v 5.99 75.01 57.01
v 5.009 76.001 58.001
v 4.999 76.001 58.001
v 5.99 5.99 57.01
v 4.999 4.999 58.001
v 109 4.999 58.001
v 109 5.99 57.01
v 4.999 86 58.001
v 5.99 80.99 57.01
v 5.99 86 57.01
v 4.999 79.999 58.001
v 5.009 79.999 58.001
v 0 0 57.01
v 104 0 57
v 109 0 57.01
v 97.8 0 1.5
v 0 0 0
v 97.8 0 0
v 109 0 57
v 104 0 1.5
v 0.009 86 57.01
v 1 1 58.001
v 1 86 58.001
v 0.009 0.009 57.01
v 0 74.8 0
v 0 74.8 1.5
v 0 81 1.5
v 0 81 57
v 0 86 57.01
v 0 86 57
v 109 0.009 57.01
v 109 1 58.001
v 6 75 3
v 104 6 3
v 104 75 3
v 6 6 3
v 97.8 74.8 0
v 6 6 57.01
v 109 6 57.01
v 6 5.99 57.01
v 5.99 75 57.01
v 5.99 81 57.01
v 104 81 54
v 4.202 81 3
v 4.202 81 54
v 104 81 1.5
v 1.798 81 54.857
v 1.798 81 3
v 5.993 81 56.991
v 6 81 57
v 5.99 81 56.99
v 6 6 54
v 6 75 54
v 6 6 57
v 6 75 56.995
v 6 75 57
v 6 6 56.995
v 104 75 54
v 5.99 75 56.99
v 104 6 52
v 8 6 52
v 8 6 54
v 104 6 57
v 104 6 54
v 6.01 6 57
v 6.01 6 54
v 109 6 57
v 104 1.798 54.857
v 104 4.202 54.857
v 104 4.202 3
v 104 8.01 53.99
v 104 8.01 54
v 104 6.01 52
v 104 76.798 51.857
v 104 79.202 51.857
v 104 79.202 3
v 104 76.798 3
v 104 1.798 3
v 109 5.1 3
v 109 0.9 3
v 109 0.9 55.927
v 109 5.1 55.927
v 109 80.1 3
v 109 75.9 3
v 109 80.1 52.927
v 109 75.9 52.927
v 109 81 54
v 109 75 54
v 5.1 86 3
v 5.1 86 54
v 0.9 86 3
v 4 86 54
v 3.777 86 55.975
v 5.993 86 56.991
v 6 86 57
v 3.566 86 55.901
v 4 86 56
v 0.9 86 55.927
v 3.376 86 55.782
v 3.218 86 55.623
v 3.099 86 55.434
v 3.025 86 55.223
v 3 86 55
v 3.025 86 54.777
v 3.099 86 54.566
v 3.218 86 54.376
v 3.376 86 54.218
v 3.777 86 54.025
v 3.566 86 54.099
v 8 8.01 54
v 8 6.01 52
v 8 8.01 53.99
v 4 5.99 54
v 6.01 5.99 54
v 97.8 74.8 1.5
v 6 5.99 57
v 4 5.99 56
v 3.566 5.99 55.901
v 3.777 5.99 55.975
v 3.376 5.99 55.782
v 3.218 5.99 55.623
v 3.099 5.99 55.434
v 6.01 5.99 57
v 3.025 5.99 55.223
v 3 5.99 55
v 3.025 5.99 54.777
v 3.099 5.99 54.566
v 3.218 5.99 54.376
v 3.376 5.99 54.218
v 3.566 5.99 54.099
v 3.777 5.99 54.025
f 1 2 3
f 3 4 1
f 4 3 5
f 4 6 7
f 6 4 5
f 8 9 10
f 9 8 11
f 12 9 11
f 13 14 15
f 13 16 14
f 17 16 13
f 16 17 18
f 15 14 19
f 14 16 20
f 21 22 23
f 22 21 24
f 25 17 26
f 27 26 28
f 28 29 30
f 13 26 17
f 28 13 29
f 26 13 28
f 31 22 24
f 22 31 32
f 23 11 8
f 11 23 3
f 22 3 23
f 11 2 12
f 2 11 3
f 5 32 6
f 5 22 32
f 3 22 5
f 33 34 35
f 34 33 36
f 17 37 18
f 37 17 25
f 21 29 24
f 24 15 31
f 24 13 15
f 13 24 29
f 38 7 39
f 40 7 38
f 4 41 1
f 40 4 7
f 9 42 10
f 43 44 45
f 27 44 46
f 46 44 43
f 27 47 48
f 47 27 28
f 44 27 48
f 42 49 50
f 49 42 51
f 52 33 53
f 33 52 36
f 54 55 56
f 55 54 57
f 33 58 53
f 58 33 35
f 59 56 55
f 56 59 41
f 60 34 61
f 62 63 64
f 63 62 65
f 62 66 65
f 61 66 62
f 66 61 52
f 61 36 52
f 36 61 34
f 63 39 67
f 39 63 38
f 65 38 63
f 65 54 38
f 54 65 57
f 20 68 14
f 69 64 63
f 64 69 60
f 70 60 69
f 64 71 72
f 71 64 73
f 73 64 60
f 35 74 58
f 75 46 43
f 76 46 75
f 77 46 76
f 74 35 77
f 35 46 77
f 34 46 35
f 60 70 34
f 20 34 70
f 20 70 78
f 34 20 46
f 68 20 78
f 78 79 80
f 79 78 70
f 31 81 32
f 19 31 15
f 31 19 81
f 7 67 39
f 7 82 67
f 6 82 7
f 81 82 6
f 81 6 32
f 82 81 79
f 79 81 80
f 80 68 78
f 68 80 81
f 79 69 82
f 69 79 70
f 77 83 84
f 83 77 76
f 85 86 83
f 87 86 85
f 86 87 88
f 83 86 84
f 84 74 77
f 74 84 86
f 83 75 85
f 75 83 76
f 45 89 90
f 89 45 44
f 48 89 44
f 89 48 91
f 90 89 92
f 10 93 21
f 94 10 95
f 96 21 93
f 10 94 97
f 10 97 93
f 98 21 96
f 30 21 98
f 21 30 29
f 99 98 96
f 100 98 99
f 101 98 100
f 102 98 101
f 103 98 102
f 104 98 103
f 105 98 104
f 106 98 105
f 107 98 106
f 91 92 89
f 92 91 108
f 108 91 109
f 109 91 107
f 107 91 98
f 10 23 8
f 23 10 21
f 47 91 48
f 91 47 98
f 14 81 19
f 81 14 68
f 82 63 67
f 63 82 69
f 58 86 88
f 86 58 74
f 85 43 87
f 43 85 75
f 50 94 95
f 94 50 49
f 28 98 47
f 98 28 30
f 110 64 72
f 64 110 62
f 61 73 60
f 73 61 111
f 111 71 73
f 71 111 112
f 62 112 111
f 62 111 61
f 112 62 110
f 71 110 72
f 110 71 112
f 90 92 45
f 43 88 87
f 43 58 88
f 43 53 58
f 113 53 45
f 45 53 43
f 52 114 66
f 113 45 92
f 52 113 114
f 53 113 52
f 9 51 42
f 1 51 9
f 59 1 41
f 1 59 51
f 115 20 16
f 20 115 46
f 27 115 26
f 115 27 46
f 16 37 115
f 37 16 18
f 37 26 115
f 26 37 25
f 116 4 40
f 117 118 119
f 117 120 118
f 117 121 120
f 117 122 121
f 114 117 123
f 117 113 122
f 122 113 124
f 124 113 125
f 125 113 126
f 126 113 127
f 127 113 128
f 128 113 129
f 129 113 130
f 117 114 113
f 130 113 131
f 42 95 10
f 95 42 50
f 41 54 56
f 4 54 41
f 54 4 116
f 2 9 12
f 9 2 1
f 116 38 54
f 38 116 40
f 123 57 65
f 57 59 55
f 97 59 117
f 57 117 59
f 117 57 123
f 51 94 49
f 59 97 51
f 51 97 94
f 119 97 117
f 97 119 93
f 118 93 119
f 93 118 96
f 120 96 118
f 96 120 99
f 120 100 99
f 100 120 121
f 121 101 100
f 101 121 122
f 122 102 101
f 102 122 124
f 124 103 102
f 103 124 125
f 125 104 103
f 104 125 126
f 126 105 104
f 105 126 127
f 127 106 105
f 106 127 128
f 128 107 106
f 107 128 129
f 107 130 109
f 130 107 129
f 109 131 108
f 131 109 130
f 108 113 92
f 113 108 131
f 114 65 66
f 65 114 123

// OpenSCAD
// ============================================================================
// cutlery_box.scad
// Graduated 3-chamber disposable-cutlery box (Option 3) — CUT-FROM-SOLID port
// of build_box.py, for a 120 x 120 x 120 mm printer (AOSEED).
//
// WHY THIS PORT EXISTS (the whole point):
//   The hand-mesh generator (build_box.py) could not keep the 1 mm rim chamfer
//   continuous across the female dovetail joints, because where a slot's flared
//   corner crosses the sloped chamfer it needs a true boolean intersection.
//   OpenSCAD HAS that boolean kernel, so here we do exactly the "cut-from-solid"
//   thing:
//      1. Build the ENTIRE box as ONE solid, WITH the chamfer already on it.
//      2. difference() out vertical dovetail prisms ( /_\ cross-section ),
//         running from just above the base plate up THROUGH the rim, to both
//         (a) form the sliding-dovetail joints, and
//         (b) split the box into 6 bed-sized pieces.
//   Because the cut is a real boolean through the already-chamfered solid, the
//   sloped chamfer<->slot edge is produced for free => the rim chamfer stays
//   CONTINUOUS across every joint, with none of the sliver hacks.
//
// ----------------------------------------------------------------------------
// HOW TO USE
//   In the app:  set `part` below (or use the Customizer dropdown), F5 to
//                preview, F6 to render, then File > Export > STL.
//   One piece (CLI):
//      openscad -o body_knife_A.stl -D 'part="knife_A"' cutlery_box.scad
//   ALL SIX (bash, run from this folder):
//      for p in knife_A knife_B fork_A fork_B spoon_A spoon_B; do \
//        openscad -o "body_$p.stl" -D "part=\"$p\"" cutlery_box.scad ; done
//   PNG preview of one piece:
//      openscad -o knife_B.png --imgsize=1400,1000 --autocenter --viewall \
//        -D 'part="knife_B"' cutlery_box.scad
//
//   Pieces are modelled in ASSEMBLED coordinates (floor-down, z=0 is the bed),
//   so importing all six STLs together shows the assembled box directly; your
//   slicer will auto-drop each one onto the plate for printing.
//
// BED SANITY: every piece is <= 120 mm in X, Y, Z.
//   Z = 58 mm. Widest piece = spoon at 117 mm (Y). A-halves reach 109 mm (X,
//   including the protruding dovetail key). All under 120.
//
// !! I could NOT run OpenSCAD to verify this file (no binary in my sandbox) !!
//   - The rim chamfer is a SMOOTH, true-45 bevel built from hull() frustums of
//     convex rectangles. Works in every OpenSCAD since ~2015 (incl. Homebrew
//     2021.01). No stepped staircase -- and, crucially, it makes box() a clean
//     well-formed solid so the per-part booleans resolve reliably (the old
//     14-slice staircase was fragile and CGAL was dropping the walls of the
//     interior parts, leaving only the key prisms => "floating boxes").
//   - roof() is still available behind USE_ROOF=true for those who have it
//     (2021.01+ snapshots); for THIS rectangular design it is identical, so it
//     is NOT required.
//   - After F6, check the console for "WARNING"/"not a valid 2-manifold".
//     If a tenon ever looks detached, bump EPS to 0.05.
// ============================================================================


/* [Part to render / export] */
part = "knife_A"; // [knife_A, knife_B, fork_A, fork_B, spoon_A, spoon_B, assembly]

/* [Chamfer method] */
// false = smooth hull() frustum bevel (default, any OpenSCAD); true = roof() (2021.01+)
USE_ROOF = false;

/* [Heights (mm)] */
BASE   = 3.0;     // floor / base-plate thickness
COMP_H = 55.0;    // interior wall height above the floor (cutlery stack depth)

/* [Walls (mm)] */
HOST_T   = 6.0;     // thickness of every wall (thick enough to host a dovetail)
HALF_LEN = 104.0;   // printed length of each half (A = near, B = far); <120 incl. key

/* [Chamber bays (mm)] */
N_COL     = 3;       // columns of cutlery per chamber
KNIFE_COL = 23.0;    // -> knife bay 69  (3 x 19 mm knives + play)
FORK_COL  = 33.0;    // -> fork  bay 99  (3 x 29 mm forks  + play)
SPOON_COL = 37.0;    // -> spoon bay 111 (3 x 34 mm spoons + play, trimmed <120)

/* [Dovetail joint (mm)] */
DT_DEPTH = 5.0;   // tail protrusion past the seam (male key depth)
DT_NECK  = 1.2;   // half-width at the seam face (narrow)
DT_FLARE = 2.1;   // half-width at the tip (wide -> locks)
DT_CLR   = 0.4;   // FLANK/seam slide clearance added to the female socket (do not change for fit)
DT_DEPTH_RELIEF = 0.3; // extra depth on the socket BACK only, so the tail tip never bottoms out

/* [Hidden-dovetail top cap / "hat" (mm)] */
// The dovetail otherwise shows its trapezoid outline on the TOP edge of the wall.
// To hide it, the MALE piece extends the wall's full-width top (chamfer included)
// across the key footprint -> a flush, continuous top. The FEMALE piece gets a
// matching top RECESS (cap footprint + CAP_CLR) so the cap drops straight in.
// Result: the top reads as one surface with a single straight seam line at the cap
// tip; the dovetail joinery lives entirely below the cap.
//
// SELF-SUPPORTING UNDERSIDE: the cap reaches the FULL wall width at the chamfer base
// (so the top edge reads as the wall extended, with NO recessed sliver on the outer
// face), and its underside is ONE planar ramp from the chamfer's OUTER CORNER
// (half-width HOST_T/2 at z = BODY_H-CHAMFER) down to the dovetail-neck half-width
// (CAP_FOOT) at CAP_SLANT_DEG from horizontal. No little horizontal step. The ramp
// reaching full width exactly at the chamfer base means "ramp top" == "chamfer base"
// (CAP_H is DERIVED). The FEMALE recess is the same ramp + CAP_CLR play.
// TRADEOFF: because the cap runs all the way to the outer corner, the female wall
// tapers to ~0 at z = BODY_H-CHAMFER -> a thin feather edge at the joint (gradual at
// CAP_SLANT_DEG, hidden inside the joint when assembled). Accepted per design intent.
CAP_SLANT_DEG = 50;     // cap underside ramp angle from horizontal (50 = self-supporting, long flare)
CAP_FOOT = DT_NECK;     // cap-underside half-width where it meets the dovetail neck
CAP_CLR = 0.3;          // slide clearance so the male cap seats into the female top recess

/* [Rim chamfer (mm)] */
CHAMFER = 1.0;    // 45-deg comfort break broken along the top wall edges

/* [Base half-lap / anti-warp (mm)] */
// Neighbouring base plates overlap as a HORIZONTAL half-lap (shiplap) at mid-base
// height, so corners stay coplanar (no lift/protrusion). Horizontal lap faces do
// NOT bind the vertical-drop assembly. Shingle direction: A->B and knife->fork->spoon.
LAP_LEN = 6;        // overlap past the A/B seam and the knife/fork seam
LAP_LEN_FS = 2;     // overlap past the fork/SPOON seam -- SMALLER: spoon is the
                    // tightest piece (117mm of the 120mm bed); a 6mm lap there
                    // would push spoon to 123mm. 2mm keeps spoon at 119mm.
LAP_Z   = BASE/2;   // 1.5 -- horizontal split height of the lap (bottom vs top half)
LAP_CLR = 0.2;      // in-plane clearance so the shelf isn't a press fit

/* [Lid — box features that receive a flat ORDERED clear sheet] */
// The lid itself is NOT printed: it's a flat ~2 mm PETG/Tritan sheet, bullnose-polished
// edges (r=LID_EDGE_R), ordered to size. We only model the box features that receive it.
LID_T            = 2.0;   // ordered sheet thickness
LID_EDGE_R       = 1.0;   // ordered sheet bullnose edge radius (for the sheet order spec)
LID_PLAY         = 0.4;   // total vertical play in the hinge groove (sheet + this)
LID_RECESS       = 2.0;   // lid TOP sits this far BELOW the rim, so the journal pocket is fully
                          // capped (rim caps the bullnose -> retains the lid when raised; tilt-in)
HINGE_AT_MINUS_X = true;  // hinge on the -x (303mm) end wall; clip on +x. (flip = mirror; default delivered)
// perimeter support ledge (lid underside rests on it at z = BODY_H-LID_T)
LEDGE_W          = 2.0;   // ledge inward protrusion (its underside ramps back at 45 deg -> self-supporting)
GROOVE_END_INSET = 0.0;   // groove reaches the corners but RUNS OUT smoothly there (no end-face / no
                          // exposed bore); GROOVE_TAPER sets the run-out length
GROOVE_TAPER     = 4.0;   // y-length over which the eased mouth tapers out at each groove end
// hinge journal (cut into the inner face of the hinge end wall, CONTINUOUS along the long edge)
GROOVE_DEPTH     = 3.0;   // 2mm lead-in slot + 1mm pocket radius -> journal sits 2mm back from the
                          // face so its cap clears the swing relief and RETAINS the lid
GROOVE_POCKET_R  = 1.0;   // journal half-cylinder radius (the bullnose sheet edge rolls in it)
// clip latch (one localized retainer, centered on the clip end wall)
CLIP_W           = 18.0;  // clip width
CLIP_LIP         = 0.4;   // retaining overhang (0.3 light .. 0.6 firm)
CLIP_RAMP_H      = 1.6;   // cam-ramp height above the rim (press-to-close)
// finger scallop (semicircular dish in the rim, centered on & aligned with the clip)
SCALLOP_W        = 16.0;  // scallop width
SCALLOP_DEPTH    = 6.0;   // how far it dishes down from the rim


/* [Hidden] */
EPS      = 0.01;          // tiny overlap so abutting solids fuse cleanly in CGAL
// Upper-chamber pieces (fork, spoon) were cut by a cell plane laid EXACTLY on the
// divider wall's far face (the lower chamber owns that wall). intersection() along a
// plane coincident with an existing box face makes CGAL leave a ZERO-THICKNESS copy
// of the wall face -> edge-manifold + "watertight" but degenerate (OpenSCAD shows it
// as a blue back-face; Tinkercad thickens it into a phantom block). SEAM_EPS nudges
// those cut planes a hair INTO the open bay so they no longer coincide with any box
// face -> no flap. 0.02 mm is physically nothing but is well clear of CGAL's tolerance.
SEAM_EPS = 0.02;
CUT_OVER = 1.0;           // how far dovetail cutters overshoot the rim (clean cut)

BODY_H    = BASE + COMP_H;     // 58  total height
END_WALL  = HOST_T;            // end walls are dovetail hosts too -> equally thick
TOTAL_LEN = 2 * HALF_LEN;      // 208 assembled length (end wall .. end wall)

// hidden-cap ramp geometry (derived).
//   CAP_HW    = cap MAX half-width = HOST_T/2 (the full wall edge) at the chamfer base.
//   CAP_RISE  = vertical height of the self-supporting CAP_SLANT_DEG underside ramp.
//   CAP_ZRAMP = where the cap reaches full width = the chamfer base (BODY_H-CHAMFER), so
//               the ramp runs straight to the chamfer OUTER CORNER (no horizontal step).
//   CAP_ZBOT  = cap bottom = ramp start; CAP_H derived from it (for reference/report).
//   CAP_ZRAMP_R = recess ramp top, shifted down by CAP_CLR so the recess ramp stays
//               parallel to the cap ramp with uniform play.
CAP_HW      = HOST_T/2;   // cap reaches the FULL wall edge at the chamfer base
CAP_RISE    = (CAP_HW - CAP_FOOT) * tan(CAP_SLANT_DEG);
CAP_ZRAMP   = BODY_H - CHAMFER;               // full width exactly at the chamfer base / outer corner
CAP_ZBOT    = CAP_ZRAMP - CAP_RISE;
CAP_H       = BODY_H - CAP_ZBOT;              // derived; reported
CAP_ZRAMP_R = CAP_ZRAMP;   // recess ramp ALSO tops at the chamfer corner (mirror the cap) -> no vertical lip
// sanity checks
assert(CAP_ZBOT > BASE + 1,
       "cap zone dips too low -- raise CAP_SLANT_DEG");
assert(CAP_HW >= DT_FLARE,
       "cap too narrow to cover the dovetail tail");

// NOTE: lid-derived constants are defined BELOW the Y-layout block, because some of
// them (INTERIOR_Y0/Y1, CLIP_CY) depend on OUTER_L / OUTER_R / EXT_W. See "lid derived".

// bay widths
KNIFE_BAY = N_COL * KNIFE_COL; // 69
FORK_BAY  = N_COL * FORK_COL;  // 99
SPOON_BAY = N_COL * SPOON_COL; // 111

// ---- Y layout (width direction): wall | bay | divider | bay | divider | bay | wall
KNIFE_Y0 = 0;
KNIFE_Y1 = HOST_T + KNIFE_BAY + HOST_T;        // 0..81   (outer wall + bay + divider)
FORK_Y0  = KNIFE_Y1;                           // 81
FORK_Y1  = FORK_Y0 + FORK_BAY + HOST_T;        // 81..186 (bay + divider)
SPOON_Y0 = FORK_Y1;                            // 186
SPOON_Y1 = SPOON_Y0 + SPOON_BAY + HOST_T;      // 186..303(bay + outer wall)
EXT_W    = SPOON_Y1;                           // 303 total width

// lengthwise wall Y-bands [y0,y1] (host the A/B dovetails) + their centers
OUTER_L  = [0, HOST_T];                                       // [0,6]    c=3
DIV_KF   = [HOST_T + KNIFE_BAY, HOST_T + KNIFE_BAY + HOST_T]; // [75,81]  c=78
DIV_FS   = [FORK_Y0 + FORK_BAY, FORK_Y0 + FORK_BAY + HOST_T]; // [180,186]c=183
OUTER_R  = [SPOON_Y1 - HOST_T, SPOON_Y1];                     // [297,303]c=300

// ---- lid derived ---- (placed AFTER OUTER_L/OUTER_R/EXT_W so nothing is forward-referenced)
LID_TOP_Z   = BODY_H - LID_RECESS;        // 56  lid TOP (recessed); rim z=58 rises LID_RECESS above it
LID_Z_UNDER = LID_TOP_Z - LID_T;          // 54  lid underside / ledge top / lowered-divider top
POCKET_CZ   = LID_TOP_Z - LID_T/2;        // 55  journal centre (lid mid) -> pocket top = LID_TOP_Z = capped
// hinge end-wall inner face x + inward direction; clip end-wall inner face x + inward dir
HINGE_INX   = HINGE_AT_MINUS_X ? END_WALL : TOTAL_LEN - END_WALL;       // 6  (default)
HINGE_IN    = HINGE_AT_MINUS_X ? 1 : -1;  // interior direction from the hinge wall (+x default)
CLIP_INX    = HINGE_AT_MINUS_X ? TOTAL_LEN - END_WALL : END_WALL;       // 202 (default)
CLIP_IN     = HINGE_AT_MINUS_X ? -1 : 1;  // interior direction from the clip wall (-x default)
POCKET_CX   = HINGE_INX - HINGE_IN*(GROOVE_DEPTH - GROOVE_POCKET_R);    // 5  pocket centre x (INTO the wall)
INTERIOR_Y0 = OUTER_L[1];                 // 6   inner face of the -y short wall
INTERIOR_Y1 = OUTER_R[0];                 // 297 inner face of the +y short wall
CLIP_CY     = EXT_W/2;                     // 151.5 clip/scallop centre (in the fork chamber)
assert(POCKET_CZ - GROOVE_POCKET_R > BASE + 1,
       "journal dips too low -- reduce LID_RECESS or LID_T");
assert(POCKET_CZ + GROOVE_POCKET_R <= LID_TOP_Z + EPS,
       "journal not capped -- lower the lid (raise LID_RECESS) or shrink GROOVE_POCKET_R");
// NOTE: with LID_RECESS the lid underside (and lowered dividers) sit BELOW CAP_ZBOT. That is
// intended: the inner dividers are cut flat below the cap zone (their hidden caps are removed,
// but the lid covers them); the perimeter/end-wall caps are untouched (full-height walls).

// the three OPEN bays are rectangular holes in the wall footprint:
//   footprint = outer rectangle MINUS these bays  (== the 6 walls; verified).
// The smooth chamfer is built from exactly this decomposition.
BAY_X0 = END_WALL;              // 6
BAY_X1 = TOTAL_LEN - END_WALL;  // 202
BAYS = [
    [BAY_X0, BAY_X1, HOST_T,   HOST_T + KNIFE_BAY],   // knife bay [6,202] x [6,75]
    [BAY_X0, BAY_X1, FORK_Y0,  FORK_Y0 + FORK_BAY],   // fork  bay [6,202] x [81,180]
    [BAY_X0, BAY_X1, SPOON_Y0, SPOON_Y0 + SPOON_BAY], // spoon bay [6,202] x [186,297]
];

YC_OUTL  = OUTER_L[0] + HOST_T/2;   // 3   outer-left wall center
YC_DIVKF = DIV_KF[0]  + HOST_T/2;   // 78  knife/fork divider center
YC_DIVFS = DIV_FS[0]  + HOST_T/2;   // 183 fork/spoon divider center
YC_OUTR  = OUTER_R[0] + HOST_T/2;   // 300 outer-right wall center

// seams
AB_SEAM = HALF_LEN;               // 104  A/B length seam (x)
SEAM_KF = FORK_Y0;                // 81   knife/fork width seam (y)
SEAM_FS = SPOON_Y0;              // 186  fork/spoon width seam (y)
ENDC_A  = END_WALL/2;             // 3    A end-wall center (x) -> chamber dovetails
ENDC_B  = TOTAL_LEN - END_WALL/2; // 205  B end-wall center (x)


// ============================================================================
// 2D wall footprint (cross-section of all walls, constant in z for the straight
// part). Union of: 2 full-width end walls + 4 lengthwise walls between them.
// ============================================================================
module wall_footprint_2d() {
    // footprint = outer rectangle minus the 3 open bays  (== the 6 walls)
    difference() {
        square([TOTAL_LEN, EXT_W]);
        for (b = BAYS) translate([b[0], b[2]]) square([b[1] - b[0], b[3] - b[2]]);
    }
}

// ============================================================================
// The full chamfered box solid = base plate + walls with a continuous 1 mm
// top-rim chamfer. Built ONCE; every piece is carved out of this.
// ============================================================================
module chamfer_cap() {
    // SMOOTH 45 rim chamfer over z[BODY_H-CHAMFER, BODY_H], in absolute coords.
    zm = BODY_H - CHAMFER;
    if (USE_ROOF) {
        // exact straight-skeleton roof, capped at CHAMFER height (needs roof()).
        intersection() {
            translate([0,0,zm]) roof() wall_footprint_2d();
            translate([0,0,zm]) linear_extrude(CHAMFER + EPS) wall_footprint_2d();
        }
    } else {
        // DEFAULT: true 45 bevel as hull() frustums of CONVEX rectangles -> smooth
        // AND a clean manifold.  Since footprint = outer - bays, the chamfer of the
        // footprint = (outer rectangle beveled inward) MINUS (each bay beveled so it
        // grows toward the top, which bevels every bay-facing rim).  All hull()s are
        // on convex rectangles, so nothing gets convex-filled.
        difference() {
            // outer perimeter frustum: full outer rect at zm -> inset by CHAMFER at top
            hull() {
                translate([0,0,zm])     linear_extrude(0.001) square([TOTAL_LEN, EXT_W]);
                translate([0,0,BODY_H]) linear_extrude(0.001) offset(delta=-CHAMFER) square([TOTAL_LEN, EXT_W]);
            }
            // each bay grows by CHAMFER toward the top -> bevels its surrounding rim.
            // (overshoots z a hair past both ends so the cut is clean.)
            for (b = BAYS)
                hull() {
                    translate([0,0,zm-EPS])     linear_extrude(0.001)
                        translate([b[0],b[2]]) offset(delta=-EPS)        square([b[1]-b[0], b[3]-b[2]]);
                    translate([0,0,BODY_H+EPS]) linear_extrude(0.001)
                        translate([b[0],b[2]]) offset(delta=CHAMFER+EPS) square([b[1]-b[0], b[3]-b[2]]);
                }
        }
    }
}

module box() {
    zm = BODY_H - CHAMFER;
    union() {
        cube([TOTAL_LEN, EXT_W, BASE]);                                        // base plate z[0,3]
        translate([0,0,BASE]) linear_extrude(zm - BASE + EPS) wall_footprint_2d(); // straight walls z[3,57]
        chamfer_cap();                                                         // smooth chamfer z[57,58]
    }
}

// ============================================================================
// Dovetail prisms ( /_\ ). Vertical, z[BASE, BODY_H+CUT_OVER] so they cut
// through the rim but leave the base plate continuous. The near face is pushed
// back EPS so a male key always fuses to its wall.
//   male key   : half_n=DT_NECK,         half_f=DT_FLARE
//   female slot: half_n=DT_NECK+DT_CLR,  half_f=DT_FLARE+DT_CLR
// ============================================================================
module dt_prism_X(seam_x, yc, half_n, half_f) {   // perpendicular to X, grows +X
    translate([0,0,BASE]) linear_extrude(BODY_H - BASE + CUT_OVER)
        polygon([[seam_x - EPS,        yc - half_n],
                 [seam_x + DT_DEPTH,   yc - half_f],
                 [seam_x + DT_DEPTH,   yc + half_f],
                 [seam_x - EPS,        yc + half_n]]);
}
module dt_prism_Y(seam_y, xc, half_n, half_f) {   // perpendicular to Y, grows +Y
    translate([0,0,BASE]) linear_extrude(BODY_H - BASE + CUT_OVER)
        polygon([[xc - half_n, seam_y - EPS],
                 [xc - half_f, seam_y + DT_DEPTH],
                 [xc + half_f, seam_y + DT_DEPTH],
                 [xc + half_n, seam_y - EPS]]);
}
module ab_key   (yc)        { dt_prism_X(AB_SEAM, yc, DT_NECK, DT_FLARE); }
module ch_key   (seam_y, xc){ dt_prism_Y(seam_y, xc, DT_NECK, DT_FLARE); }

// Female sockets = male + DT_CLR on the flanks/seam (unchanged), PLUS a straight
// back-face relief of DT_DEPTH_RELIEF so the tail tip never bottoms out. The
// relief is a rectangle tacked onto the trapezoid's tip at the SAME flare width,
// so the angled flank faces (and their 0.4 mm slide clearance) are untouched.
module ab_socket(yc) {
    dt_prism_X(AB_SEAM, yc, DT_NECK + DT_CLR, DT_FLARE + DT_CLR);
    translate([0,0,BASE]) linear_extrude(BODY_H - BASE + CUT_OVER)
        translate([AB_SEAM + DT_DEPTH, yc - (DT_FLARE + DT_CLR)])
            square([DT_DEPTH_RELIEF, 2*(DT_FLARE + DT_CLR)]);          // back relief, +X
}
module ch_socket(seam_y, xc) {
    dt_prism_Y(seam_y, xc, DT_NECK + DT_CLR, DT_FLARE + DT_CLR);
    translate([0,0,BASE]) linear_extrude(BODY_H - BASE + CUT_OVER)
        translate([xc - (DT_FLARE + DT_CLR), seam_y + DT_DEPTH])
            square([2*(DT_FLARE + DT_CLR), DT_DEPTH_RELIEF]);          // back relief, +Y
}

// ===== hidden-dovetail top cap ("hat"), SELF-SUPPORTING underside ===============
// MALE cap: a FULL-wall-width hat whose underside is ONE planar ramp from the chamfer's
// OUTER CORNER (half-width CAP_HW = HOST_T/2 at CAP_ZRAMP = BODY_H-CHAMFER) down to the
// dovetail-neck half-width (CAP_FOOT) at CAP_SLANT_DEG from horizontal -> the self-
// supporting shoulder, running straight to the corner (no horizontal step). Built as
// hull(narrow bottom slab buried in the tail neck, full-width top slab through the rim);
// box() trims it to the wall and adds the continuous rim chamfer for free, so the outer
// top edge reads as the wall extended (no recessed sliver). The protruding NOSE is left
// SQUARE (vertical) -- hidden in the female socket when assembled.
// TRADEOFF: the female wall tapers to ~0 at z=BODY_H-CHAMFER (a thin feather edge at the
// joint, gradual at CAP_SLANT_DEG) -- accepted per design intent.
module ab_cap(yc) {   // A/B seam, grows +X past the seam (length direction)
    hull() {
        translate([AB_SEAM - EPS, yc - CAP_FOOT, CAP_ZBOT])
            cube([DT_DEPTH + EPS, 2*CAP_FOOT, EPS]);
        translate([AB_SEAM - EPS, yc - CAP_HW,   CAP_ZRAMP])
            cube([DT_DEPTH + EPS, 2*CAP_HW, (BODY_H + CUT_OVER) - CAP_ZRAMP]);
    }
}
module ch_cap(seam_y, xc) {   // chamber seam, grows +Y past the seam (in the end wall)
    hull() {
        translate([xc - CAP_FOOT, seam_y - EPS, CAP_ZBOT])
            cube([2*CAP_FOOT, DT_DEPTH + EPS, EPS]);
        translate([xc - CAP_HW,   seam_y - EPS, CAP_ZRAMP])
            cube([2*CAP_HW, DT_DEPTH + EPS, (BODY_H + CUT_OVER) - CAP_ZRAMP]);
    }
}
// FEMALE recess: the SAME ramp grown by CAP_CLR (flanks, tip, floor, and ramp shifted down
// by CAP_CLR so it stays parallel) -> the cap seats with uniform slide clearance. It opens
// to the wall edge (and a hair past, into air) so the cap's full-width corner drops in;
// this is what leaves the thin female feather at the top (accepted). Open upward + toward seam.
module ab_cap_neg(yc) {
    hull() {
        translate([AB_SEAM - EPS, yc - (CAP_FOOT + CAP_CLR), CAP_ZBOT - CAP_CLR])
            cube([DT_DEPTH + CAP_CLR + EPS, 2*(CAP_FOOT + CAP_CLR), EPS]);
        translate([AB_SEAM - EPS, yc - (CAP_HW + EPS), CAP_ZRAMP_R])
            cube([DT_DEPTH + CAP_CLR + EPS, 2*(CAP_HW + EPS), (BODY_H + CUT_OVER + 1) - CAP_ZRAMP_R]);
    }
}
module ch_cap_neg(seam_y, xc) {
    hull() {
        translate([xc - (CAP_FOOT + CAP_CLR), seam_y - EPS, CAP_ZBOT - CAP_CLR])
            cube([2*(CAP_FOOT + CAP_CLR), DT_DEPTH + CAP_CLR + EPS, EPS]);
        translate([xc - (CAP_HW + EPS), seam_y - EPS, CAP_ZRAMP_R])
            cube([2*(CAP_HW + EPS), DT_DEPTH + CAP_CLR + EPS, (BODY_H + CUT_OVER + 1) - CAP_ZRAMP_R]);
    }
}
// LOWERED-DIVIDER hat: same 50-deg self-supporting cap as ab_cap, but reaching FULL width at the
// LOWERED divider top (LID_Z_UNDER) instead of the rim -- because the inner dividers are lowered
// for the lid, which strips their normal cap. It extends above the top and is trimmed flush to
// LID_Z_UNDER by divider_lower(), so the divider top reads as one surface (dovetail hidden below).
DCAP_ZRAMP = LID_Z_UNDER;            // full width at the lowered divider top (54)
DCAP_ZBOT  = DCAP_ZRAMP - CAP_RISE;  // ramp start (neck), 50 deg below
module div_cap(yc) {        // male hat on the lowered divider (A/B seam)
    hull() {
        translate([AB_SEAM - EPS, yc - CAP_FOOT, DCAP_ZBOT])
            cube([DT_DEPTH + EPS, 2*CAP_FOOT, EPS]);
        translate([AB_SEAM - EPS, yc - CAP_HW,   DCAP_ZRAMP])
            cube([DT_DEPTH + EPS, 2*CAP_HW, (BODY_H + CUT_OVER) - DCAP_ZRAMP]);
    }
}
module div_cap_neg(yc) {    // female recess to receive div_cap (with CAP_CLR slide play)
    hull() {
        translate([AB_SEAM - EPS, yc - (CAP_FOOT + CAP_CLR), DCAP_ZBOT - CAP_CLR])
            cube([DT_DEPTH + CAP_CLR + EPS, 2*(CAP_FOOT + CAP_CLR), EPS]);
        translate([AB_SEAM - EPS, yc - (CAP_HW + EPS), DCAP_ZRAMP])
            cube([DT_DEPTH + CAP_CLR + EPS, 2*(CAP_HW + EPS), (BODY_H + CUT_OVER + 1) - DCAP_ZRAMP]);
    }
}

// rectangular cell (x[xa,xb], y[ya,yb], full height + margin) used to split pieces
module cell(xa, xb, ya, yb) {
    translate([xa, ya, -1]) cube([xb - xa, yb - ya, BODY_H + 11]);
}

// ===== base half-lap (shiplap) =================================================
// HORIZONTAL lap at mid-base height: the shelf-owner keeps its BOTTOM half
// (z 0..LAP_Z) extending LAP_LEN past the seam; the neighbour has its bottom half
// REMOVED there (keeps only the top half) and lands flat on the shelf. Horizontal
// faces => no binding during the vertical drop. Shelves live entirely in the base
// (z < BASE), well clear of the wall dovetails (z >= BASE).
// Shingle = FEMALE-first (matches the no-notch dovetail assembly order, which
// lowers the male piece onto the female): the B half owns the A/B shelf (grows
// -X into A) and the UPPER chamber (fork, spoon) owns the chamber shelf (grows
// -Y into the lower chamber).  Order: spoon, fork, knife; B before A.
module lap_shelf_X(y0, y1) {                 // B-side shelf, grows -X into A past AB_SEAM
    // +EPS past AB_SEAM so the shelf interpenetrates (not just abuts) its own B body -> fuses cleanly.
    translate([AB_SEAM - LAP_LEN, y0, 0]) cube([LAP_LEN + EPS, y1 - y0, LAP_Z]);
}
module lap_neg_X(y0, y1) {                   // A-side: remove bottom half to receive it
    translate([AB_SEAM - LAP_LEN - LAP_CLR, y0 - EPS, -EPS])
        cube([LAP_LEN + LAP_CLR + EPS, (y1 - y0) + 2*EPS, LAP_Z + EPS]);
}
module lap_shelf_Y(seam_y, x0, x1, ln=LAP_LEN) {   // upper-chamber shelf, grows -Y into lower
    // grows -Y by `ln` into the lower chamber AND +Y by 2*SEAM_EPS past the seam so it
    // always overlaps the (SEAM_EPS-nudged) body floor and stays fused -> no floating shelf.
    translate([x0, seam_y - ln, 0]) cube([x1 - x0, ln + 2*SEAM_EPS, LAP_Z]);
}
module lap_neg_Y(seam_y, x0, x1, ln=LAP_LEN) {     // lower-chamber: remove bottom half
    translate([x0 - EPS, seam_y - ln - LAP_CLR, -EPS])
        cube([(x1 - x0) + 2*EPS, ln + LAP_CLR + EPS, LAP_Z + EPS]);
}

// ============================================================================
// LID FEATURES (receive a flat ORDERED clear sheet; the sheet is not printed).
// All features live at the TOP (z >= ~52), ABOVE the dovetail engagement, the half-lap
// (z<1.5) and most of the hat, so the vertical-drop assembly and joints are untouched.
// EPS overlaps throughout; no coincident coplanar faces with the existing walls.
// Default orientation: HINGE on the -x end wall (A pieces), CLIP on the +x end wall
// (B pieces), clip+scallop centred on the fork (middle) chamber.
// ============================================================================

// --- perimeter support ledge: 45-deg self-supporting brackets; rest face at LID_Z_UNDER.
//     Runs along the CLIP end wall + the two short outer walls. (Hinge wall uses the groove.)
//     Built as hull(thin top edge, wall column) -> a triangular bracket whose underside is
//     a 45-deg ramp (prints floor-down with no support). ADDED to each piece (clipped by cell).
//     Each run is INSET by LEDGE_W from the perpendicular walls so the three brackets never
//     overlap at a corner and the wall's normal chamfer wraps every corner uninterrupted.
module lid_ledge() {
    cy0 = INTERIOR_Y0 + LEDGE_W;  cy1 = INTERIOR_Y1 - LEDGE_W;  cyl = cy1 - cy0;   // clip-run y span (inset)
    sx0 = END_WALL    + LEDGE_W;  sxl = (TOTAL_LEN - 2*END_WALL) - 2*LEDGE_W;       // short-run x span (inset)
    // clip end wall (x = CLIP_INX), bracket protrudes toward interior (CLIP_IN)
    hull() {
        translate([CLIP_INX + CLIP_IN*LEDGE_W, cy0, LID_Z_UNDER - EPS]) cube([EPS, cyl, EPS]);
        translate([CLIP_INX - EPS,             cy0, LID_Z_UNDER - LEDGE_W]) cube([2*EPS, cyl, LEDGE_W]);
    }
    // OUTER_L short wall (y = INTERIOR_Y0), bracket protrudes +y
    hull() {
        translate([sx0, INTERIOR_Y0 + LEDGE_W, LID_Z_UNDER - EPS]) cube([sxl, EPS, EPS]);
        translate([sx0, INTERIOR_Y0 - EPS,     LID_Z_UNDER - LEDGE_W]) cube([sxl, 2*EPS, LEDGE_W]);
    }
    // OUTER_R short wall (y = INTERIOR_Y1), bracket protrudes -y
    hull() {
        translate([sx0, INTERIOR_Y1 - LEDGE_W, LID_Z_UNDER - EPS]) cube([sxl, EPS, EPS]);
        translate([sx0, INTERIOR_Y1 - EPS,     LID_Z_UNDER - LEDGE_W]) cube([sxl, 2*EPS, LEDGE_W]);
    }
}

// --- hinge groove: ONE 2D cross-section (journal bore + lead-in slot + 45-deg swing ramp),
//     CAPPED at the recessed lid top (LID_TOP_Z), swept along the wall. At BOTH ends the whole
//     profile RUNS OUT smoothly -- it tapers to the inner-top rim corner (HINGE_INX, BODY_H) --
//     so there is NO end-face and NO exposed bore at the corners; the groove just fades into the
//     wall. The rim caps the bullnose (retains the lid, tilt-in); the 45-deg ramp is self-
//     supporting and gives the swing clearance; the cap stays full over the bullnose => retains.
module groove_profile() {                            // 2D cross-section in (x, z)
    union() {
        translate([POCKET_CX, POCKET_CZ]) circle(r = GROOVE_POCKET_R, $fn = 28);              // journal bore
        translate([POCKET_CX, LID_Z_UNDER]) square([HINGE_INX - POCKET_CX + EPS, LID_T]);     // lead-in slot
        polygon([[POCKET_CX, LID_TOP_Z], [HINGE_INX + EPS, LID_TOP_Z], [HINGE_INX + EPS, BODY_H - CHAMFER]]); // swing relief (below the rim chamfer)
        polygon([[HINGE_INX, BODY_H - CHAMFER], [HINGE_INX + EPS, BODY_H + EPS], [HINGE_INX - CHAMFER, BODY_H + EPS]]); // rim chamfer cut, CONTINUOUS through the divider junctions (no bulge)
    }
}
module groove_extrude(y0, y1) {                      // sweep the profile along the wall, y0..y1
    translate([0, y0, 0]) rotate([90,0,0]) translate([0,0,-(y1 - y0)]) linear_extrude(y1 - y0) groove_profile();
}
module hinge_groove() {
    // journal runs STRAIGHT to the end of the wall at each side; the perpendicular short wall
    // caps the bore there (no run-out). The EPS overlap tucks the bore end into the short wall.
    groove_extrude(INTERIOR_Y0 - EPS, INTERIOR_Y1 + EPS);
}

// --- lower the inner chamber dividers to the lid underside (mid-support, no sag).
//     Removes the divider top over the full length; outer walls keep full height.
module divider_lower() {
    // x-span is the CHAMBER BAY only [BAY_X0, BAY_X1] (+EPS overlap into the end walls so the
    // cut is manifold). The end/outer walls keep their full BODY_H tops; only the two INNER
    // dividers (DIV_KF, DIV_FS) are lowered.
    translate([BAY_X0 - EPS, DIV_KF[0], LID_Z_UNDER]) cube([BAY_X1 - BAY_X0 + 2*EPS, HOST_T, BODY_H - LID_Z_UNDER + CUT_OVER]);
    translate([BAY_X0 - EPS, DIV_FS[0], LID_Z_UNDER]) cube([BAY_X1 - BAY_X0 + 2*EPS, HOST_T, BODY_H - LID_Z_UNDER + CUT_OVER]);
}

// --- retaining clip (ADDED): a lip on the clip end wall, centred on CLIP_CY, that overhangs
//     the RECESSED lid top (LID_TOP_Z) by CLIP_LIP and holds it down. A lead-in ramp above the
//     lip (up to LID_TOP_Z+CLIP_RAMP_H, still below the rim) cams the lid under as it swings
//     closed. Anchored into the wall (x = CLIP_INX-CLIP_IN*HOST_T/2). Added AFTER the scallop
//     cut so the scallop never undercuts it. No longer protrudes above the rim.
module lid_clip() {
    translate([0, CLIP_CY - CLIP_W/2, 0]) rotate([90,0,0]) translate([0,0,-CLIP_W]) linear_extrude(CLIP_W)
        polygon([[CLIP_INX - CLIP_IN*HOST_T/2, LID_TOP_Z - 0.8],         // anchor low, into the wall (fuse)
                 [CLIP_INX + CLIP_IN*CLIP_LIP, LID_TOP_Z],               // lip tip: overhang over the lid top
                 [CLIP_INX + CLIP_IN*CLIP_LIP, LID_TOP_Z + 0.4],         // lip front
                 [CLIP_INX - CLIP_IN*HOST_T/2, LID_TOP_Z + CLIP_RAMP_H]]);// lead-in ramp up into the wall
}

// --- finger scallop (CUT): a semicircular dish in the rim's INNER edge at the clip, so a
//     fingertip reaches under the lid edge to release it. Interior half only (does not
//     touch the wall body or the clip's anchor).
module lid_scallop() {
    intersection() {
        translate([CLIP_INX, CLIP_CY, BODY_H - SCALLOP_DEPTH]) cylinder(h = SCALLOP_DEPTH + EPS, r = SCALLOP_W/2, $fn = 40);
        translate([CLIP_INX + (CLIP_IN<0 ? -SCALLOP_W : 0), CLIP_CY - SCALLOP_W, BODY_H - SCALLOP_DEPTH - EPS])
            cube([SCALLOP_W, 2*SCALLOP_W, SCALLOP_DEPTH + 2*EPS]);
    }
}

// --- restore the inner-top rim chamfer where the LOWERED dividers meet the +x (clip) end wall.
//     The box chamfer is interrupted at those junctions (the divider fills the inner side before
//     it is lowered), leaving a full-height bulge once lowered. The -x/hinge side is already
//     handled by the continuous journal chamfer; this does the same at the +x end.
module div_chamfer_fix() {
    cz = BODY_H - CHAMFER;            // 57, chamfer base
    xf = TOTAL_LEN - END_WALL;        // 202, +x clip-wall inner face
    for (yb = [DIV_KF, DIV_FS])
        translate([0, yb[0] - EPS, 0]) rotate([90,0,0]) translate([0,0,-((yb[1]-yb[0])+2*EPS)]) linear_extrude((yb[1]-yb[0])+2*EPS)
            polygon([[xf, cz], [xf - EPS, BODY_H + EPS], [xf + CHAMFER, BODY_H + EPS]]);  // bevel toward the wall (x>202)
}

// ============================================================================
// The six pieces.  piece = intersection(box, cell + own male keys) - own sockets
//   A halves are MALE on the A/B seam (keep the key); B halves are FEMALE (slot).
//   On a chamber seam the LEFT chamber is male (+Y), the right chamber is female.
// ============================================================================
// Base half-lap shingling (FEMALE-first, Option 1):
//   A/B seam  -> the B half owns the bottom shelf (grows -X), A has the negative.
//   chamber   -> the UPPER chamber (fork, spoon) owns the shelf (grows -Y); the
//                lower chamber (knife, fork) has the negative.
//   Assembly order: spoon, fork, knife; B before A (male lowered onto female).
// Center crossings (104,81)&(104,186): the CHAMBER shelf (fork_A / spoon_A) owns the
//   crossing square; the B-half A/B shelf (knife_B / fork_B) is CLIPPED short of the
//   chamber seam by LAP_LEN so two shelves never collide.
module knife_A() {                                       // placed LAST; receives everything
    difference() {
        union() {
            intersection() {
                box();
                union() {
                    cell(-1, AB_SEAM, KNIFE_Y0 - 1, KNIFE_Y1);
                    ab_key(YC_OUTL); ab_key(YC_DIVKF); ch_key(SEAM_KF, ENDC_A);
                    ab_cap(YC_OUTL); div_cap(YC_DIVKF); ch_cap(SEAM_KF, ENDC_A);  // hide tops (divider uses LOWERED hat)
                }
            }
            intersection() { lid_ledge(); cell(-1, AB_SEAM, KNIFE_Y0 - 1, KNIFE_Y1); }  // lid support ledge
        }
        lap_neg_X(KNIFE_Y0, KNIFE_Y1);            // receive knife_B's A/B shelf
        lap_neg_Y(SEAM_KF, 0, AB_SEAM);           // receive fork_A's chamber shelf
        hinge_groove(); divider_lower(); lid_scallop(); div_chamfer_fix();   // lid cuts (groove hits A pieces; divider/scallop where present)
    }
}

module knife_B() {
    difference() {
        union() {
            intersection() {
                box();
                union() {
                    cell(AB_SEAM, TOTAL_LEN + 1, KNIFE_Y0 - 1, KNIFE_Y1);
                    ch_key(SEAM_KF, ENDC_B);
                    ch_cap(SEAM_KF, ENDC_B);                // hide top (male, chamber)
                }
            }
            lap_shelf_X(KNIFE_Y0, KNIFE_Y1 - LAP_LEN);  // A/B shelf -> knife_A (CLIPPED at y=81 crossing)
            intersection() { lid_ledge(); cell(AB_SEAM, TOTAL_LEN + 1, KNIFE_Y0 - 1, KNIFE_Y1); }  // lid support ledge
        }
        ab_socket(YC_OUTL); ab_socket(YC_DIVKF);
        ab_cap_neg(YC_OUTL); div_cap_neg(YC_DIVKF);      // top recesses to receive knife_A's caps (divider = LOWERED hat)
        lap_neg_Y(SEAM_KF, AB_SEAM, TOTAL_LEN);         // receive fork_B's chamber shelf
        hinge_groove(); divider_lower(); lid_scallop(); div_chamfer_fix();   // lid cuts
    }
}

module fork_A() {
    difference() {
        union() {
            intersection() {
                box();
                union() {
                    cell(-1, AB_SEAM, FORK_Y0 + SEAM_EPS, FORK_Y1);  // -Y cut nudged off the divider face
                    ab_key(YC_DIVFS); ch_key(SEAM_FS, ENDC_A);
                    div_cap(YC_DIVFS); ch_cap(SEAM_FS, ENDC_A);       // hide tops (divider uses LOWERED hat)
                }
            }
            lap_shelf_Y(SEAM_KF, 0, AB_SEAM);           // chamber shelf -> knife_A (owns crossing)
            intersection() { lid_ledge(); cell(-1, AB_SEAM, FORK_Y0 + SEAM_EPS, FORK_Y1); }  // lid support ledge (none in fork-A)
        }
        lap_neg_X(FORK_Y0, FORK_Y1);                    // receive fork_B's A/B shelf
        ch_socket(SEAM_KF, ENDC_A);
        ch_cap_neg(SEAM_KF, ENDC_A);                    // top recess to receive knife_A's chamber cap (female)
        lap_neg_Y(SEAM_FS, 0, AB_SEAM, LAP_LEN_FS);     // receive spoon_A's (small) chamber shelf
        hinge_groove(); divider_lower(); lid_scallop(); div_chamfer_fix();   // lid cuts (groove = fork-A hinge segment; divider = DIV_FS)
    }
}

module fork_B() {
    union() {
        difference() {
            union() {
                intersection() {
                    box();
                    union() {
                        cell(AB_SEAM, TOTAL_LEN + 1, FORK_Y0 + SEAM_EPS, FORK_Y1);  // -Y cut nudged off the divider face
                        ch_key(SEAM_FS, ENDC_B);
                        ch_cap(SEAM_FS, ENDC_B);                // hide top (male, chamber)
                    }
                }
                lap_shelf_X(FORK_Y0, FORK_Y1 - LAP_LEN_FS); // A/B shelf -> fork_A (CLIPPED at y=186 crossing)
                lap_shelf_Y(SEAM_KF, AB_SEAM, TOTAL_LEN);   // chamber shelf -> knife_B
                intersection() { lid_ledge(); cell(AB_SEAM, TOTAL_LEN + 1, FORK_Y0 + SEAM_EPS, FORK_Y1); }  // lid ledge (clip-end run)
            }
            ab_socket(YC_DIVFS);
            div_cap_neg(YC_DIVFS);                           // top recess to receive fork_A's A/B cap (divider = LOWERED hat)
            ch_socket(SEAM_KF, ENDC_B);
            ch_cap_neg(SEAM_KF, ENDC_B);                    // top recess to receive knife_B's chamber cap (female)
            lap_neg_Y(SEAM_FS, AB_SEAM, TOTAL_LEN, LAP_LEN_FS); // receive spoon_B's (small) chamber shelf
            hinge_groove(); divider_lower(); lid_scallop(); div_chamfer_fix();     // lid cuts (scallop lands here)
        }
        intersection() { lid_clip(); cell(AB_SEAM, TOTAL_LEN + 1, FORK_Y0 + SEAM_EPS, FORK_Y1); }  // retaining clip, added AFTER the scallop cut
    }
}

module spoon_A() {
    difference() {
        union() {
            intersection() {
                box();
                union() {
                    cell(-1, AB_SEAM, SPOON_Y0 + SEAM_EPS, SPOON_Y1 + 1);  // -Y cut nudged off the divider face
                    ab_key(YC_OUTR);
                    ab_cap(YC_OUTR);                        // hide top (male)
                }
            }
            lap_shelf_Y(SEAM_FS, 0, AB_SEAM, LAP_LEN_FS); // chamber shelf -> fork_A (small; owns crossing)
            intersection() { lid_ledge(); cell(-1, AB_SEAM, SPOON_Y0 + SEAM_EPS, SPOON_Y1 + 1); }  // lid support ledge (OUTER_R run)
        }
        lap_neg_X(SPOON_Y0, SPOON_Y1);                  // receive spoon_B's A/B shelf
        ch_socket(SEAM_FS, ENDC_A);
        ch_cap_neg(SEAM_FS, ENDC_A);                    // top recess to receive fork_A's chamber cap (female)
        hinge_groove(); divider_lower(); lid_scallop(); div_chamfer_fix();   // lid cuts (groove = spoon-A hinge segment)
    }
}

module spoon_B() {                                      // placed FIRST; owns shelves
    difference() {
        union() {
            intersection() {
                box();
                union() {
                    cell(AB_SEAM, TOTAL_LEN + 1, SPOON_Y0 + SEAM_EPS, SPOON_Y1 + 1);  // -Y cut nudged off the divider face
                }
            }
            lap_shelf_X(SPOON_Y0, SPOON_Y1);            // A/B shelf -> spoon_A
            lap_shelf_Y(SEAM_FS, AB_SEAM, TOTAL_LEN, LAP_LEN_FS); // chamber shelf -> fork_B (small)
            intersection() { lid_ledge(); cell(AB_SEAM, TOTAL_LEN + 1, SPOON_Y0 + SEAM_EPS, SPOON_Y1 + 1); }  // lid ledge (OUTER_R + clip-end runs)
        }
        ab_socket(YC_OUTR);
        ab_cap_neg(YC_OUTR);                            // top recess to receive spoon_A's A/B cap (female)
        ch_socket(SEAM_FS, ENDC_B);
        ch_cap_neg(SEAM_FS, ENDC_B);                    // top recess to receive fork_B's chamber cap (female)
        hinge_groove(); divider_lower(); lid_scallop(); div_chamfer_fix();   // lid cuts
    }
}

// TRUE assembled view: the six real, separable pieces in their assembled positions
// (slower to render — many booleans — but this is what actually shows the seams, the
// lowered dividers, the hinge journal, the clip, the scallop, and all the joints).
// For a fast no-cuts preview of just the outer shell, temporarily use box(); instead.
module assembly() {
    knife_A(); knife_B(); fork_A(); fork_B(); spoon_A(); spoon_B();
}

// ============================================================================
// Render dispatch
// ============================================================================
if      (part == "knife_A")  knife_A();
else if (part == "knife_B")  knife_B();
else if (part == "fork_A")   fork_A();
else if (part == "fork_B")   fork_B();
else if (part == "spoon_A")  spoon_A();
else if (part == "spoon_B")  spoon_B();
else if (part == "assembly") assembly();
else echo(str("Unknown part: ", part));
